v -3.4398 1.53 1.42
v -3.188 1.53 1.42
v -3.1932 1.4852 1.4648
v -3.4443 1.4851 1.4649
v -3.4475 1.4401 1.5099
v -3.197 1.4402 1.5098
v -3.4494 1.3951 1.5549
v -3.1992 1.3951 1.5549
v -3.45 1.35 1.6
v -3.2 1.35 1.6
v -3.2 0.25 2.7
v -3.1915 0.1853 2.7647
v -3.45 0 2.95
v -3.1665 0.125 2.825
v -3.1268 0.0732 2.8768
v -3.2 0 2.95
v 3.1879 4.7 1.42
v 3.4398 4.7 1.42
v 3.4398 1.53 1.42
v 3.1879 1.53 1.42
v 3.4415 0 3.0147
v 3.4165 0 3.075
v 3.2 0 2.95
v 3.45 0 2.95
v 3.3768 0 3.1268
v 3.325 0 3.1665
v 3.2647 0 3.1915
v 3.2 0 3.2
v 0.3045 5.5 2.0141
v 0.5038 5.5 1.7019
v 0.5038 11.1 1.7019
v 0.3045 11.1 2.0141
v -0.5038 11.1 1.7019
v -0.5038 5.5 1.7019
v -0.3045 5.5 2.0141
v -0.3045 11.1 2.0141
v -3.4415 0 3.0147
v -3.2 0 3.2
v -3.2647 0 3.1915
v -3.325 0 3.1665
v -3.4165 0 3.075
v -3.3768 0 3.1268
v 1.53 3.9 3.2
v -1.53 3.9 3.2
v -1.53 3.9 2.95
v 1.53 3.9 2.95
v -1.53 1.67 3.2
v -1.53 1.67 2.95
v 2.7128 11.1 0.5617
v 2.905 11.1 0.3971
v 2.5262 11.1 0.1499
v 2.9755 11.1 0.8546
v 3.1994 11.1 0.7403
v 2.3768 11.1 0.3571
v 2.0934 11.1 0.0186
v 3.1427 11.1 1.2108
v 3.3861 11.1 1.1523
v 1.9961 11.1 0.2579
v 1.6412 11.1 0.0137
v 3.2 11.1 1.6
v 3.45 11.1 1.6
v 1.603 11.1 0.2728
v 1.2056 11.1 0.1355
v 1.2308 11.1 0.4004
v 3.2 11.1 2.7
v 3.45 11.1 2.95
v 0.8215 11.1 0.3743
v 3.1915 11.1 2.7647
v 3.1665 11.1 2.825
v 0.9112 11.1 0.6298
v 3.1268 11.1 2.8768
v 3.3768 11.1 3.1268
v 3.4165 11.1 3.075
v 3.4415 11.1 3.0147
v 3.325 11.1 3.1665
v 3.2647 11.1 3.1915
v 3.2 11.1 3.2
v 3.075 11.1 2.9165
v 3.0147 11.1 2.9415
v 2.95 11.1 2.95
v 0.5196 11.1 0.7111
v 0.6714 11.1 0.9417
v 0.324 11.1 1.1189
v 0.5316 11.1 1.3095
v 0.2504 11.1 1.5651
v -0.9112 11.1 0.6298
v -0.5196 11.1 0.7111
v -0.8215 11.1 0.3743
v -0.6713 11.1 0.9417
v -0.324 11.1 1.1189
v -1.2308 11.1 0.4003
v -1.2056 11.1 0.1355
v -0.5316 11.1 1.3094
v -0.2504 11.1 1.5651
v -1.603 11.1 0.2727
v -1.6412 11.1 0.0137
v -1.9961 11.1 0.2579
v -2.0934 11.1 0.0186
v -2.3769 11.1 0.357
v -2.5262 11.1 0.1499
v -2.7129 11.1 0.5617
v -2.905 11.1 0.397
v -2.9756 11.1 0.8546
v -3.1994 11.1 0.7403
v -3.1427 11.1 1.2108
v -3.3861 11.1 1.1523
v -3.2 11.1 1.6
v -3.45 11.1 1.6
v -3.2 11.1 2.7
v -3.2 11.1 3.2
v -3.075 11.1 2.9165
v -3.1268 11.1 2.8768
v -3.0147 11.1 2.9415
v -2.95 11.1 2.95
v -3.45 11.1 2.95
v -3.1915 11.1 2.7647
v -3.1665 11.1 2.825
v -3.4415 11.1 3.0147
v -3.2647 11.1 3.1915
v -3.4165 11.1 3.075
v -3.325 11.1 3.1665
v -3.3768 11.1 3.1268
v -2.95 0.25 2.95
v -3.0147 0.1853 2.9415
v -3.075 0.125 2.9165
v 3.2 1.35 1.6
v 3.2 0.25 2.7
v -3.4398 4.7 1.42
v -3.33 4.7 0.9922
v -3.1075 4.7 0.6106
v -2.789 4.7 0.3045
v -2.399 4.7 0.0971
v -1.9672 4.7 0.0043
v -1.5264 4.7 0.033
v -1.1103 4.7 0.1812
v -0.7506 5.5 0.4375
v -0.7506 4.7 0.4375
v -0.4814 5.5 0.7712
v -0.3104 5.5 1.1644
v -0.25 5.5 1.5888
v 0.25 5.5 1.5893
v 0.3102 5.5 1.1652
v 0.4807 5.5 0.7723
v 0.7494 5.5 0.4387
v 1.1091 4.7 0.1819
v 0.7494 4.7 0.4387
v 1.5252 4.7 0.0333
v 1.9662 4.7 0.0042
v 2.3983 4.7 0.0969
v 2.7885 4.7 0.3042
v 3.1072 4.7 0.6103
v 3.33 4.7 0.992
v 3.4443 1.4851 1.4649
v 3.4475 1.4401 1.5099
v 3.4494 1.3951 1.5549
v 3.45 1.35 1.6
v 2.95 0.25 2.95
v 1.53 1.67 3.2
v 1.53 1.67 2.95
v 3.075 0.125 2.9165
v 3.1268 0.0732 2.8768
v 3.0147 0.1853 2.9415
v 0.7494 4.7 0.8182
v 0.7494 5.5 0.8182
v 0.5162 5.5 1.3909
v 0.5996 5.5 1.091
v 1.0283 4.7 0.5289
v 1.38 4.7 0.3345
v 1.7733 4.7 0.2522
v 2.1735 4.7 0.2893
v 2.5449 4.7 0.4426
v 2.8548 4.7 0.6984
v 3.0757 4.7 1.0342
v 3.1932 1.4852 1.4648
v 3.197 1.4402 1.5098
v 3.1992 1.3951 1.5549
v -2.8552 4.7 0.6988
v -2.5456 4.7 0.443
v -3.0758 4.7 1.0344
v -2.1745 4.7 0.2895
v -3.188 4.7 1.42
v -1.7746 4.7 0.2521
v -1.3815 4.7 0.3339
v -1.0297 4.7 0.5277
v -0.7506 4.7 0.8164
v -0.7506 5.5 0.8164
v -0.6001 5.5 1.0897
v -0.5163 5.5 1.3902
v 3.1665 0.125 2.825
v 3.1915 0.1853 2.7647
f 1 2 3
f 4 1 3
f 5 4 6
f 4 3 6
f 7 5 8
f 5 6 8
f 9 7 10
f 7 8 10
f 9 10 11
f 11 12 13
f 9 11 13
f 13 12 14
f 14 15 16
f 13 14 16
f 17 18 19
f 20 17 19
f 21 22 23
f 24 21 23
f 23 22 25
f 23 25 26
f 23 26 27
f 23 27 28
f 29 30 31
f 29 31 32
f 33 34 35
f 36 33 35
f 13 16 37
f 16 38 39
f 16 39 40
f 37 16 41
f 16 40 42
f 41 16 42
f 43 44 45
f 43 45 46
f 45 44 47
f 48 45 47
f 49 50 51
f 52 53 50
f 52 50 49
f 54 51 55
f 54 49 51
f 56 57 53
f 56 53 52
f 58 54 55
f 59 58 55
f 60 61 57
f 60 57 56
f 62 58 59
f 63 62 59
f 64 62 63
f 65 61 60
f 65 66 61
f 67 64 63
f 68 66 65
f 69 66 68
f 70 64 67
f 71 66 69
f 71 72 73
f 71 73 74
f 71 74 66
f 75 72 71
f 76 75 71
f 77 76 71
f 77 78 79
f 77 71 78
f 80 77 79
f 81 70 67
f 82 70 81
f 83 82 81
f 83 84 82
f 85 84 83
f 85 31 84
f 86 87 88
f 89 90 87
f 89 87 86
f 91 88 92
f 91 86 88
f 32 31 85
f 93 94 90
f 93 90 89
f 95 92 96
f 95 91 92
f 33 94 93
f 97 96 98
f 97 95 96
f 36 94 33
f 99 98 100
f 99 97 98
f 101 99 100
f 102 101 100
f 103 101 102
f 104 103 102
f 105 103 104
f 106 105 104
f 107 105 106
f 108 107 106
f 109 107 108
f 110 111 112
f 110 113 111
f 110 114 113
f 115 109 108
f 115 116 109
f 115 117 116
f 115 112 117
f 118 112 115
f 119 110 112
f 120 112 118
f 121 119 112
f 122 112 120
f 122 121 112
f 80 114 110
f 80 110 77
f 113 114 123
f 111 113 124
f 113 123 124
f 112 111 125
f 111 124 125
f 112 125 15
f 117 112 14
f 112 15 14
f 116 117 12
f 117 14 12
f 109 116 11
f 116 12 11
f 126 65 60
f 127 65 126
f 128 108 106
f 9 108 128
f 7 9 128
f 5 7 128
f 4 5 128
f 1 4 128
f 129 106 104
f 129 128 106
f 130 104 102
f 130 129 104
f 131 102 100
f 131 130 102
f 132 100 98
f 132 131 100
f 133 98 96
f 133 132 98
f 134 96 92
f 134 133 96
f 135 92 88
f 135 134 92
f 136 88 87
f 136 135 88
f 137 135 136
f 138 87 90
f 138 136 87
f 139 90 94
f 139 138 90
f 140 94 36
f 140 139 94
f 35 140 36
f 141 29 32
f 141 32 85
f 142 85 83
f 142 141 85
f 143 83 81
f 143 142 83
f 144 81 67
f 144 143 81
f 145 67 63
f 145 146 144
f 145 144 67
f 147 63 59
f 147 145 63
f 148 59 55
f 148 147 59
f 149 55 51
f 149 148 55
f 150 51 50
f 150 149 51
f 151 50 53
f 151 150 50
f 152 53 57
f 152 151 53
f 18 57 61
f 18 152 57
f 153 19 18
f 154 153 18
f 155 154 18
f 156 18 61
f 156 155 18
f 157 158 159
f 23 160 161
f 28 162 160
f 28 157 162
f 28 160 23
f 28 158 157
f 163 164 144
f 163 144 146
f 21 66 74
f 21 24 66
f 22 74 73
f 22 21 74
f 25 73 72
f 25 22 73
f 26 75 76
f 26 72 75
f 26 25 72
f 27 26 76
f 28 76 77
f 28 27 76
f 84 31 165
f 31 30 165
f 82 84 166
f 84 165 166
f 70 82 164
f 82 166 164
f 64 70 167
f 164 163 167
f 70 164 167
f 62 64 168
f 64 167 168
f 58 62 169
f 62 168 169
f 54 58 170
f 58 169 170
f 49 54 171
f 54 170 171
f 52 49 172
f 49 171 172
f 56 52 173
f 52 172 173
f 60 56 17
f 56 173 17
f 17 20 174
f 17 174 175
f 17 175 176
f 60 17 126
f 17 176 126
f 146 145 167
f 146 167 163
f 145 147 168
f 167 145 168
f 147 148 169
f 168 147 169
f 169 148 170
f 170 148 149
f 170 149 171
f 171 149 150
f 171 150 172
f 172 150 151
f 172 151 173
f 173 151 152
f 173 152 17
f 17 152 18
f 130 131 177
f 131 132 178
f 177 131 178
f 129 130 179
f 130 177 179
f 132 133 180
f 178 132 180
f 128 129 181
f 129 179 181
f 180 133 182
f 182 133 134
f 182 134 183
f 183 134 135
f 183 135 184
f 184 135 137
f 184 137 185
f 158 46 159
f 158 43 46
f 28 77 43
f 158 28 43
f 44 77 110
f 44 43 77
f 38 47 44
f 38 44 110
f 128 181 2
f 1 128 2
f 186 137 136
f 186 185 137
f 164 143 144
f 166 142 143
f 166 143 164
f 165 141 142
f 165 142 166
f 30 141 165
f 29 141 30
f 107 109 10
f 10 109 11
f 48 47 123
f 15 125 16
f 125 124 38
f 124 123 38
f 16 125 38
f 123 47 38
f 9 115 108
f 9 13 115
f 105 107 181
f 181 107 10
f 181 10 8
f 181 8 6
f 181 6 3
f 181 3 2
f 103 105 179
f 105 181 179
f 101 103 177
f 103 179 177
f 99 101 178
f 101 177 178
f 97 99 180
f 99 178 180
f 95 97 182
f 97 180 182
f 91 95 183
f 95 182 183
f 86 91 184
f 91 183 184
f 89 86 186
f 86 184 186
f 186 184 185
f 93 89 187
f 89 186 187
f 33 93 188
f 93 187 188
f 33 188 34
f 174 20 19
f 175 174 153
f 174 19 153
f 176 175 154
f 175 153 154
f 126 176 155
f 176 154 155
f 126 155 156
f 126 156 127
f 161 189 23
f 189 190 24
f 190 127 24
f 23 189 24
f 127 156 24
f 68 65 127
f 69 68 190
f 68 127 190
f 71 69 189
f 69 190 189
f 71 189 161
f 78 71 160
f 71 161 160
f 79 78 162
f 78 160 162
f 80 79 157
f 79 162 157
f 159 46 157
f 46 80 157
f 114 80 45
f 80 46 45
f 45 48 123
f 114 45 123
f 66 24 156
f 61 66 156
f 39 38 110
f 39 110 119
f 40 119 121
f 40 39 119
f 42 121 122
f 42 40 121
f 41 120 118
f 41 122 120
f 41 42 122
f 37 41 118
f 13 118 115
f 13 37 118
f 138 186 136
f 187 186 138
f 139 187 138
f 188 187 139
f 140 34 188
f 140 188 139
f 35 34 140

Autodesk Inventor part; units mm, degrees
ref_plane "YZ Plane" through (0, 0, 0) normal (1, 0, 0) x (0, 1, 0)
ref_plane "XZ Plane" through (0, 0, 0) normal (0, 1, 0) x (-1, 0, 0)
ref_plane "XY Plane" through (0, 0, 0) normal (0, 0, 1) x (1, 0, 0)
sketch "Sketch1" plane through (0, 0, 0) normal (0, 1, 0) x (-1, 0, 0)
  line L0 (0, 3.2) -> (-3.2, 3.2)
  line L1 (-3.45, 2.95) -> (-3.45, 1.6)
  arc A0 (-3.45, 1.6) -> (-0.3045, 2.0141) centre (-1.85, 1.6) ccw
  line L2 (0, 0) -> (-5.7029, 0) construction
  line L3 (-1.85, 1.6) -> (-0.3045, 2.0141) construction
  line L4 (0, 2.95) -> (-2.95, 2.95)
  line L5 (-3.2, 2.7) -> (-3.2, 1.6)
  arc A1 (-3.2, 1.6) -> (-0.5038, 1.7019) centre (-1.85, 1.6) ccw
  line L6 (-0.5038, 1.7019) -> (-1.7853, 1.3585) construction
  line L7 (-0.5038, 1.7019) -> (-0.3045, 2.0141)
  line L8 (0, 0) -> (0, 1.4199) construction
  line L9 (0, 3.2) -> (3.2, 3.2)
  line L10 (3.45, 2.95) -> (3.45, 1.6)
  arc A2 (0.3045, 2.0141) -> (3.45, 1.6) centre (1.85, 1.6) ccw
  line L11 (0, 0) -> (5.7029, 0) construction
  line L12 (1.85, 1.6) -> (0.3045, 2.0141) construction
  line L13 (0, 2.95) -> (2.95, 2.95)
  line L14 (3.2, 2.7) -> (3.2, 1.6)
  arc A3 (0.5038, 1.7019) -> (3.2, 1.6) centre (1.85, 1.6) ccw
  line L15 (0.5038, 1.7019) -> (1.7853, 1.3585) construction
  line L16 (0.5038, 1.7019) -> (0.3045, 2.0141)
  arc A4 (-3.2, 3.2) -> (-3.45, 2.95) centre (-3.2, 2.95) ccw
  arc A5 (-2.95, 2.95) -> (-3.2, 2.7) centre (-2.95, 2.7) ccw
  arc A6 (3.2, 2.7) -> (2.95, 2.95) centre (2.95, 2.7) ccw
  arc A7 (3.45, 2.95) -> (3.2, 3.2) centre (3.2, 2.95) ccw
  point P0 (-3.45, 3.2)
  point P1 (-3.2, 2.95)
  point P2 (3.45, 3.2)
  point P3 (3.2, 2.95)
  dimension "d0" = 3.45
  dimension "d1" = 0
  dimension "d2" = 3.2
  dimension "d3" = 15
  dimension "d4" = 1.6
  dimension "d5" = 1.6
  dimension "d6" = 0.25
  dimension "d9" = 0.25
  dimension "d10" = 0.25
  dimension "d11" = 0.25
  dimension "d12" = 0.25
extrude "Extrusion1" add sketch "Sketch1" along normal blind 11.1
sketch "Sketch2" plane through (-3.2, 0, 3.2) normal (0, 0, 1) x (1, 0, 0)
  line L0 (0, 0) -> (6.4, 0) projected
  line L1 (0, 11.1) -> (6.4, 11.1) projected
  line L2 (0, 0) -> (0, 11.1) projected
  line L3 (3.2, 0) -> (3.2, 8.5352) construction
  line L4 (3.2, 3.9) -> (1.67, 3.9)
  line L5 (1.67, 3.9) -> (1.67, 1.67)
  line L6 (1.67, 1.67) -> (0, 0)
  line L7 (-0.25, 0) -> (-0.25, 11.1) projected
  line L8 (3.2, 3.9) -> (4.73, 3.9)
  line L9 (4.73, 3.9) -> (4.73, 1.67)
  line L10 (4.73, 1.67) -> (6.4, 0)
  dimension "d27" = 7.2
  dimension "d28" = 45
  dimension "d29" = 1.92
  dimension "d30" = 1.53
sketch "Sketch3" plane through (3.45, 0, 2.95) normal (1, 0, 0) x (0, 0, -1)
  line L0 (0, 0) -> (0, 11.1) projected
  line L1 (6.53, 4.7) -> (1.53, 4.7)
  line L2 (1.53, 4.7) -> (1.53, 1.53)
  line L3 (1.53, 1.53) -> (0, 0)
  line L4 (6.53, 4.7) -> (6.53, -3)
  line L5 (6.53, -3) -> (0, -3)
  line L6 (0, -3) -> (0, 0)
  line L7 (2.95, 11.1) -> (0.9359, 11.1) projected
  line L8 (-0.25, 0) -> (-0.25, 11.1) projected
  point P0 (2.95, 0)
  dimension "d13" = 6.4
  dimension "d14" = 1.78
  dimension "d15" = 45
  dimension "d16" = 3
  dimension "d17" = 5
extrude "Extrusion2" cut sketch "Sketch3" against normal through all
sketch "Sketch4" plane through (-0.2602, 4.7, 1.42) normal (0, 0, -1) x (-1, 0, 0)
  line L0 (-1.0096, -4.7) -> (0.4904, -4.7)
  line L1 (0.4904, -4.7) -> (0.4904, 0.8)
  line L2 (0.4904, 0.8) -> (-1.0096, 0.8)
  line L3 (-1.0096, 0.8) -> (-1.0096, -4.7)
  line L4 (-1.0096, -4.7) -> (0.4904, 0.8) construction
  line L5 (0.4904, -4.7) -> (-1.0096, 0.8) construction
  point P0 (-0.2602, -4.7)
  point P1 (-0.2596, -1.95)
  dimension "d20" = 1.5
  dimension "d21" = 0
  dimension "d22" = 5.5
extrude "Extrusion3" cut sketch "Sketch4" along normal blind 11.1 and the other way blind 1
extrude "Extrusion4" cut sketch "Sketch2" against normal through all
equation "\"d4\" = d5"
properties part number "FuseHolder" material "Steel"
